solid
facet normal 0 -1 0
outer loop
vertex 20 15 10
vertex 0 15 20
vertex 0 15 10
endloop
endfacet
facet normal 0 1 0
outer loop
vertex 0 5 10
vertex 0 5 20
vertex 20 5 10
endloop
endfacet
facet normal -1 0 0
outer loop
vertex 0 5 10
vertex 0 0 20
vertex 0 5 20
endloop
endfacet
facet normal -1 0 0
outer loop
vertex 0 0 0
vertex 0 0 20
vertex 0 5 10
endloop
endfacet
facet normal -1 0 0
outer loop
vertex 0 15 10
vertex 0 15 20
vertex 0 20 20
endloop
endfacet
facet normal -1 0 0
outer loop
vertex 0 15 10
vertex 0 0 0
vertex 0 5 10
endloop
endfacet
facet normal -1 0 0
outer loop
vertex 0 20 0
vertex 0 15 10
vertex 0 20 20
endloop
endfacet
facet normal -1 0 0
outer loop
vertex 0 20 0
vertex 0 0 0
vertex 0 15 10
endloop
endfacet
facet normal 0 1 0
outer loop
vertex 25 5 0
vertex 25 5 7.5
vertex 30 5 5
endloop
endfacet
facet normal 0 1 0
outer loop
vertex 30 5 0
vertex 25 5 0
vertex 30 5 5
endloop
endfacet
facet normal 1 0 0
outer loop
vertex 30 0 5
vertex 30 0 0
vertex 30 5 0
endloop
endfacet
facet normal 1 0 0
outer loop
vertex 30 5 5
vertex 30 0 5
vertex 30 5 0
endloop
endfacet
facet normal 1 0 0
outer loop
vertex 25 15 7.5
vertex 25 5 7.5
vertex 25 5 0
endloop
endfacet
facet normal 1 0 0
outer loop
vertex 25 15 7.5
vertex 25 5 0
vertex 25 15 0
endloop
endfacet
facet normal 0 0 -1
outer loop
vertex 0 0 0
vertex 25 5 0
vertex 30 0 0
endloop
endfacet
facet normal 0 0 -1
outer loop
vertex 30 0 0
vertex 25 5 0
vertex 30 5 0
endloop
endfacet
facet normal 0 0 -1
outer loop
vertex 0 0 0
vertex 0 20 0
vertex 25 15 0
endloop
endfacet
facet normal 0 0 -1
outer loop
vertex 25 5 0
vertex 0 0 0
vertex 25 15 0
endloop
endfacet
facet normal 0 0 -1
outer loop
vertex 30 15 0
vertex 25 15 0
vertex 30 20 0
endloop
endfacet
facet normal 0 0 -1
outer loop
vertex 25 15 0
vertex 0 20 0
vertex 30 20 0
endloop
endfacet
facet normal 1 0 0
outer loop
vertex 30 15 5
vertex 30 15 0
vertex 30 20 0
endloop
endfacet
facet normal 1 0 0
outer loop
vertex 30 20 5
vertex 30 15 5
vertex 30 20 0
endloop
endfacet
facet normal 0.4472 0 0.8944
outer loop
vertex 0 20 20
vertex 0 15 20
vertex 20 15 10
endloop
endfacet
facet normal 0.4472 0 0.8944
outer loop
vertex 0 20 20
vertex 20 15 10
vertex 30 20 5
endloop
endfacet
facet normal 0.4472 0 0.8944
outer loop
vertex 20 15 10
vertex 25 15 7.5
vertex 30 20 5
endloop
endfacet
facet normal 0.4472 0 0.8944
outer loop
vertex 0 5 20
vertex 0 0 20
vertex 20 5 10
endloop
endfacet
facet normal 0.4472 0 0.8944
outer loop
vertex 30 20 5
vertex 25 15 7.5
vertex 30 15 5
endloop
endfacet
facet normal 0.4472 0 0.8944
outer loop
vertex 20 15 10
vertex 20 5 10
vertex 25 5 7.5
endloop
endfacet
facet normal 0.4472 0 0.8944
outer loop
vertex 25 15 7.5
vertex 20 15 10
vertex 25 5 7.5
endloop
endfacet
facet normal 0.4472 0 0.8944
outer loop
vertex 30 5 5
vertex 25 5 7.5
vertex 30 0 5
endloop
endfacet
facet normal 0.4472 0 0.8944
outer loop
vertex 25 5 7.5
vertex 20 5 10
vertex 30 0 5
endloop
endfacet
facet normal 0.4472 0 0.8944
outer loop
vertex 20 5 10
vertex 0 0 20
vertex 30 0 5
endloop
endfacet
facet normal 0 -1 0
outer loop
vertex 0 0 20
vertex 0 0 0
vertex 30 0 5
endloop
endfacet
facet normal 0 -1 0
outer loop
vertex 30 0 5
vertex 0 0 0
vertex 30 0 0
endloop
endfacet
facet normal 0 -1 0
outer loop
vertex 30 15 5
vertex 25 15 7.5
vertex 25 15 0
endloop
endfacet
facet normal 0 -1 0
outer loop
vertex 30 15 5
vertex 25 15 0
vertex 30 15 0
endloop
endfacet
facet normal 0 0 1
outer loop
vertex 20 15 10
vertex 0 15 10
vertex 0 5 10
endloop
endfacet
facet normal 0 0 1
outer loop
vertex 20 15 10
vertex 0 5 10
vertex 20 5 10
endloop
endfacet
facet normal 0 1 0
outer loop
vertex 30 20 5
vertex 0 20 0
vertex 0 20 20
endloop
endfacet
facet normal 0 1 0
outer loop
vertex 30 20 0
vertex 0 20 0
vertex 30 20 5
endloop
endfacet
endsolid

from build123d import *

# Parameters (mm, degrees)
F0_W     = 30
F0_H     = 20
F1_DEPTH = 20
F2_W     = 5
F2_H     = 10
F3_DEPTH = 20.001
F4_W     = 20
F4_H     = 10
F5_DEPTH = 10
F7_DEPTH = 20.001


with BuildPart() as f1:
    # F0 (on Top) → F1 (new body)
    with BuildSketch(Plane.XY):
        with Locations((15, 10)):
            Rectangle(F0_W, F0_H)
    extrude(amount=F1_DEPTH)

    # F2 (on face) → F3 (cut, through all)
    with BuildSketch(Plane.XY.offset(20)):
        with Locations((27.5, 10)):
            Rectangle(F2_W, F2_H)
    extrude(amount=-F3_DEPTH, mode=Mode.SUBTRACT)

    # F4 (on face) → F5 (cut)
    with BuildSketch(Plane.XY.offset(20)):
        with Locations((10, 10)):
            Rectangle(F4_W, F4_H)
    extrude(amount=-F5_DEPTH, mode=Mode.SUBTRACT)

    # F6 (on face) → F7 (cut, through all)
    with BuildSketch(Plane.XZ):
        Polygon((30, 20), (0, 20), (30, 5), align=None)
    extrude(amount=-F7_DEPTH, mode=Mode.SUBTRACT)


solid = f1.part
